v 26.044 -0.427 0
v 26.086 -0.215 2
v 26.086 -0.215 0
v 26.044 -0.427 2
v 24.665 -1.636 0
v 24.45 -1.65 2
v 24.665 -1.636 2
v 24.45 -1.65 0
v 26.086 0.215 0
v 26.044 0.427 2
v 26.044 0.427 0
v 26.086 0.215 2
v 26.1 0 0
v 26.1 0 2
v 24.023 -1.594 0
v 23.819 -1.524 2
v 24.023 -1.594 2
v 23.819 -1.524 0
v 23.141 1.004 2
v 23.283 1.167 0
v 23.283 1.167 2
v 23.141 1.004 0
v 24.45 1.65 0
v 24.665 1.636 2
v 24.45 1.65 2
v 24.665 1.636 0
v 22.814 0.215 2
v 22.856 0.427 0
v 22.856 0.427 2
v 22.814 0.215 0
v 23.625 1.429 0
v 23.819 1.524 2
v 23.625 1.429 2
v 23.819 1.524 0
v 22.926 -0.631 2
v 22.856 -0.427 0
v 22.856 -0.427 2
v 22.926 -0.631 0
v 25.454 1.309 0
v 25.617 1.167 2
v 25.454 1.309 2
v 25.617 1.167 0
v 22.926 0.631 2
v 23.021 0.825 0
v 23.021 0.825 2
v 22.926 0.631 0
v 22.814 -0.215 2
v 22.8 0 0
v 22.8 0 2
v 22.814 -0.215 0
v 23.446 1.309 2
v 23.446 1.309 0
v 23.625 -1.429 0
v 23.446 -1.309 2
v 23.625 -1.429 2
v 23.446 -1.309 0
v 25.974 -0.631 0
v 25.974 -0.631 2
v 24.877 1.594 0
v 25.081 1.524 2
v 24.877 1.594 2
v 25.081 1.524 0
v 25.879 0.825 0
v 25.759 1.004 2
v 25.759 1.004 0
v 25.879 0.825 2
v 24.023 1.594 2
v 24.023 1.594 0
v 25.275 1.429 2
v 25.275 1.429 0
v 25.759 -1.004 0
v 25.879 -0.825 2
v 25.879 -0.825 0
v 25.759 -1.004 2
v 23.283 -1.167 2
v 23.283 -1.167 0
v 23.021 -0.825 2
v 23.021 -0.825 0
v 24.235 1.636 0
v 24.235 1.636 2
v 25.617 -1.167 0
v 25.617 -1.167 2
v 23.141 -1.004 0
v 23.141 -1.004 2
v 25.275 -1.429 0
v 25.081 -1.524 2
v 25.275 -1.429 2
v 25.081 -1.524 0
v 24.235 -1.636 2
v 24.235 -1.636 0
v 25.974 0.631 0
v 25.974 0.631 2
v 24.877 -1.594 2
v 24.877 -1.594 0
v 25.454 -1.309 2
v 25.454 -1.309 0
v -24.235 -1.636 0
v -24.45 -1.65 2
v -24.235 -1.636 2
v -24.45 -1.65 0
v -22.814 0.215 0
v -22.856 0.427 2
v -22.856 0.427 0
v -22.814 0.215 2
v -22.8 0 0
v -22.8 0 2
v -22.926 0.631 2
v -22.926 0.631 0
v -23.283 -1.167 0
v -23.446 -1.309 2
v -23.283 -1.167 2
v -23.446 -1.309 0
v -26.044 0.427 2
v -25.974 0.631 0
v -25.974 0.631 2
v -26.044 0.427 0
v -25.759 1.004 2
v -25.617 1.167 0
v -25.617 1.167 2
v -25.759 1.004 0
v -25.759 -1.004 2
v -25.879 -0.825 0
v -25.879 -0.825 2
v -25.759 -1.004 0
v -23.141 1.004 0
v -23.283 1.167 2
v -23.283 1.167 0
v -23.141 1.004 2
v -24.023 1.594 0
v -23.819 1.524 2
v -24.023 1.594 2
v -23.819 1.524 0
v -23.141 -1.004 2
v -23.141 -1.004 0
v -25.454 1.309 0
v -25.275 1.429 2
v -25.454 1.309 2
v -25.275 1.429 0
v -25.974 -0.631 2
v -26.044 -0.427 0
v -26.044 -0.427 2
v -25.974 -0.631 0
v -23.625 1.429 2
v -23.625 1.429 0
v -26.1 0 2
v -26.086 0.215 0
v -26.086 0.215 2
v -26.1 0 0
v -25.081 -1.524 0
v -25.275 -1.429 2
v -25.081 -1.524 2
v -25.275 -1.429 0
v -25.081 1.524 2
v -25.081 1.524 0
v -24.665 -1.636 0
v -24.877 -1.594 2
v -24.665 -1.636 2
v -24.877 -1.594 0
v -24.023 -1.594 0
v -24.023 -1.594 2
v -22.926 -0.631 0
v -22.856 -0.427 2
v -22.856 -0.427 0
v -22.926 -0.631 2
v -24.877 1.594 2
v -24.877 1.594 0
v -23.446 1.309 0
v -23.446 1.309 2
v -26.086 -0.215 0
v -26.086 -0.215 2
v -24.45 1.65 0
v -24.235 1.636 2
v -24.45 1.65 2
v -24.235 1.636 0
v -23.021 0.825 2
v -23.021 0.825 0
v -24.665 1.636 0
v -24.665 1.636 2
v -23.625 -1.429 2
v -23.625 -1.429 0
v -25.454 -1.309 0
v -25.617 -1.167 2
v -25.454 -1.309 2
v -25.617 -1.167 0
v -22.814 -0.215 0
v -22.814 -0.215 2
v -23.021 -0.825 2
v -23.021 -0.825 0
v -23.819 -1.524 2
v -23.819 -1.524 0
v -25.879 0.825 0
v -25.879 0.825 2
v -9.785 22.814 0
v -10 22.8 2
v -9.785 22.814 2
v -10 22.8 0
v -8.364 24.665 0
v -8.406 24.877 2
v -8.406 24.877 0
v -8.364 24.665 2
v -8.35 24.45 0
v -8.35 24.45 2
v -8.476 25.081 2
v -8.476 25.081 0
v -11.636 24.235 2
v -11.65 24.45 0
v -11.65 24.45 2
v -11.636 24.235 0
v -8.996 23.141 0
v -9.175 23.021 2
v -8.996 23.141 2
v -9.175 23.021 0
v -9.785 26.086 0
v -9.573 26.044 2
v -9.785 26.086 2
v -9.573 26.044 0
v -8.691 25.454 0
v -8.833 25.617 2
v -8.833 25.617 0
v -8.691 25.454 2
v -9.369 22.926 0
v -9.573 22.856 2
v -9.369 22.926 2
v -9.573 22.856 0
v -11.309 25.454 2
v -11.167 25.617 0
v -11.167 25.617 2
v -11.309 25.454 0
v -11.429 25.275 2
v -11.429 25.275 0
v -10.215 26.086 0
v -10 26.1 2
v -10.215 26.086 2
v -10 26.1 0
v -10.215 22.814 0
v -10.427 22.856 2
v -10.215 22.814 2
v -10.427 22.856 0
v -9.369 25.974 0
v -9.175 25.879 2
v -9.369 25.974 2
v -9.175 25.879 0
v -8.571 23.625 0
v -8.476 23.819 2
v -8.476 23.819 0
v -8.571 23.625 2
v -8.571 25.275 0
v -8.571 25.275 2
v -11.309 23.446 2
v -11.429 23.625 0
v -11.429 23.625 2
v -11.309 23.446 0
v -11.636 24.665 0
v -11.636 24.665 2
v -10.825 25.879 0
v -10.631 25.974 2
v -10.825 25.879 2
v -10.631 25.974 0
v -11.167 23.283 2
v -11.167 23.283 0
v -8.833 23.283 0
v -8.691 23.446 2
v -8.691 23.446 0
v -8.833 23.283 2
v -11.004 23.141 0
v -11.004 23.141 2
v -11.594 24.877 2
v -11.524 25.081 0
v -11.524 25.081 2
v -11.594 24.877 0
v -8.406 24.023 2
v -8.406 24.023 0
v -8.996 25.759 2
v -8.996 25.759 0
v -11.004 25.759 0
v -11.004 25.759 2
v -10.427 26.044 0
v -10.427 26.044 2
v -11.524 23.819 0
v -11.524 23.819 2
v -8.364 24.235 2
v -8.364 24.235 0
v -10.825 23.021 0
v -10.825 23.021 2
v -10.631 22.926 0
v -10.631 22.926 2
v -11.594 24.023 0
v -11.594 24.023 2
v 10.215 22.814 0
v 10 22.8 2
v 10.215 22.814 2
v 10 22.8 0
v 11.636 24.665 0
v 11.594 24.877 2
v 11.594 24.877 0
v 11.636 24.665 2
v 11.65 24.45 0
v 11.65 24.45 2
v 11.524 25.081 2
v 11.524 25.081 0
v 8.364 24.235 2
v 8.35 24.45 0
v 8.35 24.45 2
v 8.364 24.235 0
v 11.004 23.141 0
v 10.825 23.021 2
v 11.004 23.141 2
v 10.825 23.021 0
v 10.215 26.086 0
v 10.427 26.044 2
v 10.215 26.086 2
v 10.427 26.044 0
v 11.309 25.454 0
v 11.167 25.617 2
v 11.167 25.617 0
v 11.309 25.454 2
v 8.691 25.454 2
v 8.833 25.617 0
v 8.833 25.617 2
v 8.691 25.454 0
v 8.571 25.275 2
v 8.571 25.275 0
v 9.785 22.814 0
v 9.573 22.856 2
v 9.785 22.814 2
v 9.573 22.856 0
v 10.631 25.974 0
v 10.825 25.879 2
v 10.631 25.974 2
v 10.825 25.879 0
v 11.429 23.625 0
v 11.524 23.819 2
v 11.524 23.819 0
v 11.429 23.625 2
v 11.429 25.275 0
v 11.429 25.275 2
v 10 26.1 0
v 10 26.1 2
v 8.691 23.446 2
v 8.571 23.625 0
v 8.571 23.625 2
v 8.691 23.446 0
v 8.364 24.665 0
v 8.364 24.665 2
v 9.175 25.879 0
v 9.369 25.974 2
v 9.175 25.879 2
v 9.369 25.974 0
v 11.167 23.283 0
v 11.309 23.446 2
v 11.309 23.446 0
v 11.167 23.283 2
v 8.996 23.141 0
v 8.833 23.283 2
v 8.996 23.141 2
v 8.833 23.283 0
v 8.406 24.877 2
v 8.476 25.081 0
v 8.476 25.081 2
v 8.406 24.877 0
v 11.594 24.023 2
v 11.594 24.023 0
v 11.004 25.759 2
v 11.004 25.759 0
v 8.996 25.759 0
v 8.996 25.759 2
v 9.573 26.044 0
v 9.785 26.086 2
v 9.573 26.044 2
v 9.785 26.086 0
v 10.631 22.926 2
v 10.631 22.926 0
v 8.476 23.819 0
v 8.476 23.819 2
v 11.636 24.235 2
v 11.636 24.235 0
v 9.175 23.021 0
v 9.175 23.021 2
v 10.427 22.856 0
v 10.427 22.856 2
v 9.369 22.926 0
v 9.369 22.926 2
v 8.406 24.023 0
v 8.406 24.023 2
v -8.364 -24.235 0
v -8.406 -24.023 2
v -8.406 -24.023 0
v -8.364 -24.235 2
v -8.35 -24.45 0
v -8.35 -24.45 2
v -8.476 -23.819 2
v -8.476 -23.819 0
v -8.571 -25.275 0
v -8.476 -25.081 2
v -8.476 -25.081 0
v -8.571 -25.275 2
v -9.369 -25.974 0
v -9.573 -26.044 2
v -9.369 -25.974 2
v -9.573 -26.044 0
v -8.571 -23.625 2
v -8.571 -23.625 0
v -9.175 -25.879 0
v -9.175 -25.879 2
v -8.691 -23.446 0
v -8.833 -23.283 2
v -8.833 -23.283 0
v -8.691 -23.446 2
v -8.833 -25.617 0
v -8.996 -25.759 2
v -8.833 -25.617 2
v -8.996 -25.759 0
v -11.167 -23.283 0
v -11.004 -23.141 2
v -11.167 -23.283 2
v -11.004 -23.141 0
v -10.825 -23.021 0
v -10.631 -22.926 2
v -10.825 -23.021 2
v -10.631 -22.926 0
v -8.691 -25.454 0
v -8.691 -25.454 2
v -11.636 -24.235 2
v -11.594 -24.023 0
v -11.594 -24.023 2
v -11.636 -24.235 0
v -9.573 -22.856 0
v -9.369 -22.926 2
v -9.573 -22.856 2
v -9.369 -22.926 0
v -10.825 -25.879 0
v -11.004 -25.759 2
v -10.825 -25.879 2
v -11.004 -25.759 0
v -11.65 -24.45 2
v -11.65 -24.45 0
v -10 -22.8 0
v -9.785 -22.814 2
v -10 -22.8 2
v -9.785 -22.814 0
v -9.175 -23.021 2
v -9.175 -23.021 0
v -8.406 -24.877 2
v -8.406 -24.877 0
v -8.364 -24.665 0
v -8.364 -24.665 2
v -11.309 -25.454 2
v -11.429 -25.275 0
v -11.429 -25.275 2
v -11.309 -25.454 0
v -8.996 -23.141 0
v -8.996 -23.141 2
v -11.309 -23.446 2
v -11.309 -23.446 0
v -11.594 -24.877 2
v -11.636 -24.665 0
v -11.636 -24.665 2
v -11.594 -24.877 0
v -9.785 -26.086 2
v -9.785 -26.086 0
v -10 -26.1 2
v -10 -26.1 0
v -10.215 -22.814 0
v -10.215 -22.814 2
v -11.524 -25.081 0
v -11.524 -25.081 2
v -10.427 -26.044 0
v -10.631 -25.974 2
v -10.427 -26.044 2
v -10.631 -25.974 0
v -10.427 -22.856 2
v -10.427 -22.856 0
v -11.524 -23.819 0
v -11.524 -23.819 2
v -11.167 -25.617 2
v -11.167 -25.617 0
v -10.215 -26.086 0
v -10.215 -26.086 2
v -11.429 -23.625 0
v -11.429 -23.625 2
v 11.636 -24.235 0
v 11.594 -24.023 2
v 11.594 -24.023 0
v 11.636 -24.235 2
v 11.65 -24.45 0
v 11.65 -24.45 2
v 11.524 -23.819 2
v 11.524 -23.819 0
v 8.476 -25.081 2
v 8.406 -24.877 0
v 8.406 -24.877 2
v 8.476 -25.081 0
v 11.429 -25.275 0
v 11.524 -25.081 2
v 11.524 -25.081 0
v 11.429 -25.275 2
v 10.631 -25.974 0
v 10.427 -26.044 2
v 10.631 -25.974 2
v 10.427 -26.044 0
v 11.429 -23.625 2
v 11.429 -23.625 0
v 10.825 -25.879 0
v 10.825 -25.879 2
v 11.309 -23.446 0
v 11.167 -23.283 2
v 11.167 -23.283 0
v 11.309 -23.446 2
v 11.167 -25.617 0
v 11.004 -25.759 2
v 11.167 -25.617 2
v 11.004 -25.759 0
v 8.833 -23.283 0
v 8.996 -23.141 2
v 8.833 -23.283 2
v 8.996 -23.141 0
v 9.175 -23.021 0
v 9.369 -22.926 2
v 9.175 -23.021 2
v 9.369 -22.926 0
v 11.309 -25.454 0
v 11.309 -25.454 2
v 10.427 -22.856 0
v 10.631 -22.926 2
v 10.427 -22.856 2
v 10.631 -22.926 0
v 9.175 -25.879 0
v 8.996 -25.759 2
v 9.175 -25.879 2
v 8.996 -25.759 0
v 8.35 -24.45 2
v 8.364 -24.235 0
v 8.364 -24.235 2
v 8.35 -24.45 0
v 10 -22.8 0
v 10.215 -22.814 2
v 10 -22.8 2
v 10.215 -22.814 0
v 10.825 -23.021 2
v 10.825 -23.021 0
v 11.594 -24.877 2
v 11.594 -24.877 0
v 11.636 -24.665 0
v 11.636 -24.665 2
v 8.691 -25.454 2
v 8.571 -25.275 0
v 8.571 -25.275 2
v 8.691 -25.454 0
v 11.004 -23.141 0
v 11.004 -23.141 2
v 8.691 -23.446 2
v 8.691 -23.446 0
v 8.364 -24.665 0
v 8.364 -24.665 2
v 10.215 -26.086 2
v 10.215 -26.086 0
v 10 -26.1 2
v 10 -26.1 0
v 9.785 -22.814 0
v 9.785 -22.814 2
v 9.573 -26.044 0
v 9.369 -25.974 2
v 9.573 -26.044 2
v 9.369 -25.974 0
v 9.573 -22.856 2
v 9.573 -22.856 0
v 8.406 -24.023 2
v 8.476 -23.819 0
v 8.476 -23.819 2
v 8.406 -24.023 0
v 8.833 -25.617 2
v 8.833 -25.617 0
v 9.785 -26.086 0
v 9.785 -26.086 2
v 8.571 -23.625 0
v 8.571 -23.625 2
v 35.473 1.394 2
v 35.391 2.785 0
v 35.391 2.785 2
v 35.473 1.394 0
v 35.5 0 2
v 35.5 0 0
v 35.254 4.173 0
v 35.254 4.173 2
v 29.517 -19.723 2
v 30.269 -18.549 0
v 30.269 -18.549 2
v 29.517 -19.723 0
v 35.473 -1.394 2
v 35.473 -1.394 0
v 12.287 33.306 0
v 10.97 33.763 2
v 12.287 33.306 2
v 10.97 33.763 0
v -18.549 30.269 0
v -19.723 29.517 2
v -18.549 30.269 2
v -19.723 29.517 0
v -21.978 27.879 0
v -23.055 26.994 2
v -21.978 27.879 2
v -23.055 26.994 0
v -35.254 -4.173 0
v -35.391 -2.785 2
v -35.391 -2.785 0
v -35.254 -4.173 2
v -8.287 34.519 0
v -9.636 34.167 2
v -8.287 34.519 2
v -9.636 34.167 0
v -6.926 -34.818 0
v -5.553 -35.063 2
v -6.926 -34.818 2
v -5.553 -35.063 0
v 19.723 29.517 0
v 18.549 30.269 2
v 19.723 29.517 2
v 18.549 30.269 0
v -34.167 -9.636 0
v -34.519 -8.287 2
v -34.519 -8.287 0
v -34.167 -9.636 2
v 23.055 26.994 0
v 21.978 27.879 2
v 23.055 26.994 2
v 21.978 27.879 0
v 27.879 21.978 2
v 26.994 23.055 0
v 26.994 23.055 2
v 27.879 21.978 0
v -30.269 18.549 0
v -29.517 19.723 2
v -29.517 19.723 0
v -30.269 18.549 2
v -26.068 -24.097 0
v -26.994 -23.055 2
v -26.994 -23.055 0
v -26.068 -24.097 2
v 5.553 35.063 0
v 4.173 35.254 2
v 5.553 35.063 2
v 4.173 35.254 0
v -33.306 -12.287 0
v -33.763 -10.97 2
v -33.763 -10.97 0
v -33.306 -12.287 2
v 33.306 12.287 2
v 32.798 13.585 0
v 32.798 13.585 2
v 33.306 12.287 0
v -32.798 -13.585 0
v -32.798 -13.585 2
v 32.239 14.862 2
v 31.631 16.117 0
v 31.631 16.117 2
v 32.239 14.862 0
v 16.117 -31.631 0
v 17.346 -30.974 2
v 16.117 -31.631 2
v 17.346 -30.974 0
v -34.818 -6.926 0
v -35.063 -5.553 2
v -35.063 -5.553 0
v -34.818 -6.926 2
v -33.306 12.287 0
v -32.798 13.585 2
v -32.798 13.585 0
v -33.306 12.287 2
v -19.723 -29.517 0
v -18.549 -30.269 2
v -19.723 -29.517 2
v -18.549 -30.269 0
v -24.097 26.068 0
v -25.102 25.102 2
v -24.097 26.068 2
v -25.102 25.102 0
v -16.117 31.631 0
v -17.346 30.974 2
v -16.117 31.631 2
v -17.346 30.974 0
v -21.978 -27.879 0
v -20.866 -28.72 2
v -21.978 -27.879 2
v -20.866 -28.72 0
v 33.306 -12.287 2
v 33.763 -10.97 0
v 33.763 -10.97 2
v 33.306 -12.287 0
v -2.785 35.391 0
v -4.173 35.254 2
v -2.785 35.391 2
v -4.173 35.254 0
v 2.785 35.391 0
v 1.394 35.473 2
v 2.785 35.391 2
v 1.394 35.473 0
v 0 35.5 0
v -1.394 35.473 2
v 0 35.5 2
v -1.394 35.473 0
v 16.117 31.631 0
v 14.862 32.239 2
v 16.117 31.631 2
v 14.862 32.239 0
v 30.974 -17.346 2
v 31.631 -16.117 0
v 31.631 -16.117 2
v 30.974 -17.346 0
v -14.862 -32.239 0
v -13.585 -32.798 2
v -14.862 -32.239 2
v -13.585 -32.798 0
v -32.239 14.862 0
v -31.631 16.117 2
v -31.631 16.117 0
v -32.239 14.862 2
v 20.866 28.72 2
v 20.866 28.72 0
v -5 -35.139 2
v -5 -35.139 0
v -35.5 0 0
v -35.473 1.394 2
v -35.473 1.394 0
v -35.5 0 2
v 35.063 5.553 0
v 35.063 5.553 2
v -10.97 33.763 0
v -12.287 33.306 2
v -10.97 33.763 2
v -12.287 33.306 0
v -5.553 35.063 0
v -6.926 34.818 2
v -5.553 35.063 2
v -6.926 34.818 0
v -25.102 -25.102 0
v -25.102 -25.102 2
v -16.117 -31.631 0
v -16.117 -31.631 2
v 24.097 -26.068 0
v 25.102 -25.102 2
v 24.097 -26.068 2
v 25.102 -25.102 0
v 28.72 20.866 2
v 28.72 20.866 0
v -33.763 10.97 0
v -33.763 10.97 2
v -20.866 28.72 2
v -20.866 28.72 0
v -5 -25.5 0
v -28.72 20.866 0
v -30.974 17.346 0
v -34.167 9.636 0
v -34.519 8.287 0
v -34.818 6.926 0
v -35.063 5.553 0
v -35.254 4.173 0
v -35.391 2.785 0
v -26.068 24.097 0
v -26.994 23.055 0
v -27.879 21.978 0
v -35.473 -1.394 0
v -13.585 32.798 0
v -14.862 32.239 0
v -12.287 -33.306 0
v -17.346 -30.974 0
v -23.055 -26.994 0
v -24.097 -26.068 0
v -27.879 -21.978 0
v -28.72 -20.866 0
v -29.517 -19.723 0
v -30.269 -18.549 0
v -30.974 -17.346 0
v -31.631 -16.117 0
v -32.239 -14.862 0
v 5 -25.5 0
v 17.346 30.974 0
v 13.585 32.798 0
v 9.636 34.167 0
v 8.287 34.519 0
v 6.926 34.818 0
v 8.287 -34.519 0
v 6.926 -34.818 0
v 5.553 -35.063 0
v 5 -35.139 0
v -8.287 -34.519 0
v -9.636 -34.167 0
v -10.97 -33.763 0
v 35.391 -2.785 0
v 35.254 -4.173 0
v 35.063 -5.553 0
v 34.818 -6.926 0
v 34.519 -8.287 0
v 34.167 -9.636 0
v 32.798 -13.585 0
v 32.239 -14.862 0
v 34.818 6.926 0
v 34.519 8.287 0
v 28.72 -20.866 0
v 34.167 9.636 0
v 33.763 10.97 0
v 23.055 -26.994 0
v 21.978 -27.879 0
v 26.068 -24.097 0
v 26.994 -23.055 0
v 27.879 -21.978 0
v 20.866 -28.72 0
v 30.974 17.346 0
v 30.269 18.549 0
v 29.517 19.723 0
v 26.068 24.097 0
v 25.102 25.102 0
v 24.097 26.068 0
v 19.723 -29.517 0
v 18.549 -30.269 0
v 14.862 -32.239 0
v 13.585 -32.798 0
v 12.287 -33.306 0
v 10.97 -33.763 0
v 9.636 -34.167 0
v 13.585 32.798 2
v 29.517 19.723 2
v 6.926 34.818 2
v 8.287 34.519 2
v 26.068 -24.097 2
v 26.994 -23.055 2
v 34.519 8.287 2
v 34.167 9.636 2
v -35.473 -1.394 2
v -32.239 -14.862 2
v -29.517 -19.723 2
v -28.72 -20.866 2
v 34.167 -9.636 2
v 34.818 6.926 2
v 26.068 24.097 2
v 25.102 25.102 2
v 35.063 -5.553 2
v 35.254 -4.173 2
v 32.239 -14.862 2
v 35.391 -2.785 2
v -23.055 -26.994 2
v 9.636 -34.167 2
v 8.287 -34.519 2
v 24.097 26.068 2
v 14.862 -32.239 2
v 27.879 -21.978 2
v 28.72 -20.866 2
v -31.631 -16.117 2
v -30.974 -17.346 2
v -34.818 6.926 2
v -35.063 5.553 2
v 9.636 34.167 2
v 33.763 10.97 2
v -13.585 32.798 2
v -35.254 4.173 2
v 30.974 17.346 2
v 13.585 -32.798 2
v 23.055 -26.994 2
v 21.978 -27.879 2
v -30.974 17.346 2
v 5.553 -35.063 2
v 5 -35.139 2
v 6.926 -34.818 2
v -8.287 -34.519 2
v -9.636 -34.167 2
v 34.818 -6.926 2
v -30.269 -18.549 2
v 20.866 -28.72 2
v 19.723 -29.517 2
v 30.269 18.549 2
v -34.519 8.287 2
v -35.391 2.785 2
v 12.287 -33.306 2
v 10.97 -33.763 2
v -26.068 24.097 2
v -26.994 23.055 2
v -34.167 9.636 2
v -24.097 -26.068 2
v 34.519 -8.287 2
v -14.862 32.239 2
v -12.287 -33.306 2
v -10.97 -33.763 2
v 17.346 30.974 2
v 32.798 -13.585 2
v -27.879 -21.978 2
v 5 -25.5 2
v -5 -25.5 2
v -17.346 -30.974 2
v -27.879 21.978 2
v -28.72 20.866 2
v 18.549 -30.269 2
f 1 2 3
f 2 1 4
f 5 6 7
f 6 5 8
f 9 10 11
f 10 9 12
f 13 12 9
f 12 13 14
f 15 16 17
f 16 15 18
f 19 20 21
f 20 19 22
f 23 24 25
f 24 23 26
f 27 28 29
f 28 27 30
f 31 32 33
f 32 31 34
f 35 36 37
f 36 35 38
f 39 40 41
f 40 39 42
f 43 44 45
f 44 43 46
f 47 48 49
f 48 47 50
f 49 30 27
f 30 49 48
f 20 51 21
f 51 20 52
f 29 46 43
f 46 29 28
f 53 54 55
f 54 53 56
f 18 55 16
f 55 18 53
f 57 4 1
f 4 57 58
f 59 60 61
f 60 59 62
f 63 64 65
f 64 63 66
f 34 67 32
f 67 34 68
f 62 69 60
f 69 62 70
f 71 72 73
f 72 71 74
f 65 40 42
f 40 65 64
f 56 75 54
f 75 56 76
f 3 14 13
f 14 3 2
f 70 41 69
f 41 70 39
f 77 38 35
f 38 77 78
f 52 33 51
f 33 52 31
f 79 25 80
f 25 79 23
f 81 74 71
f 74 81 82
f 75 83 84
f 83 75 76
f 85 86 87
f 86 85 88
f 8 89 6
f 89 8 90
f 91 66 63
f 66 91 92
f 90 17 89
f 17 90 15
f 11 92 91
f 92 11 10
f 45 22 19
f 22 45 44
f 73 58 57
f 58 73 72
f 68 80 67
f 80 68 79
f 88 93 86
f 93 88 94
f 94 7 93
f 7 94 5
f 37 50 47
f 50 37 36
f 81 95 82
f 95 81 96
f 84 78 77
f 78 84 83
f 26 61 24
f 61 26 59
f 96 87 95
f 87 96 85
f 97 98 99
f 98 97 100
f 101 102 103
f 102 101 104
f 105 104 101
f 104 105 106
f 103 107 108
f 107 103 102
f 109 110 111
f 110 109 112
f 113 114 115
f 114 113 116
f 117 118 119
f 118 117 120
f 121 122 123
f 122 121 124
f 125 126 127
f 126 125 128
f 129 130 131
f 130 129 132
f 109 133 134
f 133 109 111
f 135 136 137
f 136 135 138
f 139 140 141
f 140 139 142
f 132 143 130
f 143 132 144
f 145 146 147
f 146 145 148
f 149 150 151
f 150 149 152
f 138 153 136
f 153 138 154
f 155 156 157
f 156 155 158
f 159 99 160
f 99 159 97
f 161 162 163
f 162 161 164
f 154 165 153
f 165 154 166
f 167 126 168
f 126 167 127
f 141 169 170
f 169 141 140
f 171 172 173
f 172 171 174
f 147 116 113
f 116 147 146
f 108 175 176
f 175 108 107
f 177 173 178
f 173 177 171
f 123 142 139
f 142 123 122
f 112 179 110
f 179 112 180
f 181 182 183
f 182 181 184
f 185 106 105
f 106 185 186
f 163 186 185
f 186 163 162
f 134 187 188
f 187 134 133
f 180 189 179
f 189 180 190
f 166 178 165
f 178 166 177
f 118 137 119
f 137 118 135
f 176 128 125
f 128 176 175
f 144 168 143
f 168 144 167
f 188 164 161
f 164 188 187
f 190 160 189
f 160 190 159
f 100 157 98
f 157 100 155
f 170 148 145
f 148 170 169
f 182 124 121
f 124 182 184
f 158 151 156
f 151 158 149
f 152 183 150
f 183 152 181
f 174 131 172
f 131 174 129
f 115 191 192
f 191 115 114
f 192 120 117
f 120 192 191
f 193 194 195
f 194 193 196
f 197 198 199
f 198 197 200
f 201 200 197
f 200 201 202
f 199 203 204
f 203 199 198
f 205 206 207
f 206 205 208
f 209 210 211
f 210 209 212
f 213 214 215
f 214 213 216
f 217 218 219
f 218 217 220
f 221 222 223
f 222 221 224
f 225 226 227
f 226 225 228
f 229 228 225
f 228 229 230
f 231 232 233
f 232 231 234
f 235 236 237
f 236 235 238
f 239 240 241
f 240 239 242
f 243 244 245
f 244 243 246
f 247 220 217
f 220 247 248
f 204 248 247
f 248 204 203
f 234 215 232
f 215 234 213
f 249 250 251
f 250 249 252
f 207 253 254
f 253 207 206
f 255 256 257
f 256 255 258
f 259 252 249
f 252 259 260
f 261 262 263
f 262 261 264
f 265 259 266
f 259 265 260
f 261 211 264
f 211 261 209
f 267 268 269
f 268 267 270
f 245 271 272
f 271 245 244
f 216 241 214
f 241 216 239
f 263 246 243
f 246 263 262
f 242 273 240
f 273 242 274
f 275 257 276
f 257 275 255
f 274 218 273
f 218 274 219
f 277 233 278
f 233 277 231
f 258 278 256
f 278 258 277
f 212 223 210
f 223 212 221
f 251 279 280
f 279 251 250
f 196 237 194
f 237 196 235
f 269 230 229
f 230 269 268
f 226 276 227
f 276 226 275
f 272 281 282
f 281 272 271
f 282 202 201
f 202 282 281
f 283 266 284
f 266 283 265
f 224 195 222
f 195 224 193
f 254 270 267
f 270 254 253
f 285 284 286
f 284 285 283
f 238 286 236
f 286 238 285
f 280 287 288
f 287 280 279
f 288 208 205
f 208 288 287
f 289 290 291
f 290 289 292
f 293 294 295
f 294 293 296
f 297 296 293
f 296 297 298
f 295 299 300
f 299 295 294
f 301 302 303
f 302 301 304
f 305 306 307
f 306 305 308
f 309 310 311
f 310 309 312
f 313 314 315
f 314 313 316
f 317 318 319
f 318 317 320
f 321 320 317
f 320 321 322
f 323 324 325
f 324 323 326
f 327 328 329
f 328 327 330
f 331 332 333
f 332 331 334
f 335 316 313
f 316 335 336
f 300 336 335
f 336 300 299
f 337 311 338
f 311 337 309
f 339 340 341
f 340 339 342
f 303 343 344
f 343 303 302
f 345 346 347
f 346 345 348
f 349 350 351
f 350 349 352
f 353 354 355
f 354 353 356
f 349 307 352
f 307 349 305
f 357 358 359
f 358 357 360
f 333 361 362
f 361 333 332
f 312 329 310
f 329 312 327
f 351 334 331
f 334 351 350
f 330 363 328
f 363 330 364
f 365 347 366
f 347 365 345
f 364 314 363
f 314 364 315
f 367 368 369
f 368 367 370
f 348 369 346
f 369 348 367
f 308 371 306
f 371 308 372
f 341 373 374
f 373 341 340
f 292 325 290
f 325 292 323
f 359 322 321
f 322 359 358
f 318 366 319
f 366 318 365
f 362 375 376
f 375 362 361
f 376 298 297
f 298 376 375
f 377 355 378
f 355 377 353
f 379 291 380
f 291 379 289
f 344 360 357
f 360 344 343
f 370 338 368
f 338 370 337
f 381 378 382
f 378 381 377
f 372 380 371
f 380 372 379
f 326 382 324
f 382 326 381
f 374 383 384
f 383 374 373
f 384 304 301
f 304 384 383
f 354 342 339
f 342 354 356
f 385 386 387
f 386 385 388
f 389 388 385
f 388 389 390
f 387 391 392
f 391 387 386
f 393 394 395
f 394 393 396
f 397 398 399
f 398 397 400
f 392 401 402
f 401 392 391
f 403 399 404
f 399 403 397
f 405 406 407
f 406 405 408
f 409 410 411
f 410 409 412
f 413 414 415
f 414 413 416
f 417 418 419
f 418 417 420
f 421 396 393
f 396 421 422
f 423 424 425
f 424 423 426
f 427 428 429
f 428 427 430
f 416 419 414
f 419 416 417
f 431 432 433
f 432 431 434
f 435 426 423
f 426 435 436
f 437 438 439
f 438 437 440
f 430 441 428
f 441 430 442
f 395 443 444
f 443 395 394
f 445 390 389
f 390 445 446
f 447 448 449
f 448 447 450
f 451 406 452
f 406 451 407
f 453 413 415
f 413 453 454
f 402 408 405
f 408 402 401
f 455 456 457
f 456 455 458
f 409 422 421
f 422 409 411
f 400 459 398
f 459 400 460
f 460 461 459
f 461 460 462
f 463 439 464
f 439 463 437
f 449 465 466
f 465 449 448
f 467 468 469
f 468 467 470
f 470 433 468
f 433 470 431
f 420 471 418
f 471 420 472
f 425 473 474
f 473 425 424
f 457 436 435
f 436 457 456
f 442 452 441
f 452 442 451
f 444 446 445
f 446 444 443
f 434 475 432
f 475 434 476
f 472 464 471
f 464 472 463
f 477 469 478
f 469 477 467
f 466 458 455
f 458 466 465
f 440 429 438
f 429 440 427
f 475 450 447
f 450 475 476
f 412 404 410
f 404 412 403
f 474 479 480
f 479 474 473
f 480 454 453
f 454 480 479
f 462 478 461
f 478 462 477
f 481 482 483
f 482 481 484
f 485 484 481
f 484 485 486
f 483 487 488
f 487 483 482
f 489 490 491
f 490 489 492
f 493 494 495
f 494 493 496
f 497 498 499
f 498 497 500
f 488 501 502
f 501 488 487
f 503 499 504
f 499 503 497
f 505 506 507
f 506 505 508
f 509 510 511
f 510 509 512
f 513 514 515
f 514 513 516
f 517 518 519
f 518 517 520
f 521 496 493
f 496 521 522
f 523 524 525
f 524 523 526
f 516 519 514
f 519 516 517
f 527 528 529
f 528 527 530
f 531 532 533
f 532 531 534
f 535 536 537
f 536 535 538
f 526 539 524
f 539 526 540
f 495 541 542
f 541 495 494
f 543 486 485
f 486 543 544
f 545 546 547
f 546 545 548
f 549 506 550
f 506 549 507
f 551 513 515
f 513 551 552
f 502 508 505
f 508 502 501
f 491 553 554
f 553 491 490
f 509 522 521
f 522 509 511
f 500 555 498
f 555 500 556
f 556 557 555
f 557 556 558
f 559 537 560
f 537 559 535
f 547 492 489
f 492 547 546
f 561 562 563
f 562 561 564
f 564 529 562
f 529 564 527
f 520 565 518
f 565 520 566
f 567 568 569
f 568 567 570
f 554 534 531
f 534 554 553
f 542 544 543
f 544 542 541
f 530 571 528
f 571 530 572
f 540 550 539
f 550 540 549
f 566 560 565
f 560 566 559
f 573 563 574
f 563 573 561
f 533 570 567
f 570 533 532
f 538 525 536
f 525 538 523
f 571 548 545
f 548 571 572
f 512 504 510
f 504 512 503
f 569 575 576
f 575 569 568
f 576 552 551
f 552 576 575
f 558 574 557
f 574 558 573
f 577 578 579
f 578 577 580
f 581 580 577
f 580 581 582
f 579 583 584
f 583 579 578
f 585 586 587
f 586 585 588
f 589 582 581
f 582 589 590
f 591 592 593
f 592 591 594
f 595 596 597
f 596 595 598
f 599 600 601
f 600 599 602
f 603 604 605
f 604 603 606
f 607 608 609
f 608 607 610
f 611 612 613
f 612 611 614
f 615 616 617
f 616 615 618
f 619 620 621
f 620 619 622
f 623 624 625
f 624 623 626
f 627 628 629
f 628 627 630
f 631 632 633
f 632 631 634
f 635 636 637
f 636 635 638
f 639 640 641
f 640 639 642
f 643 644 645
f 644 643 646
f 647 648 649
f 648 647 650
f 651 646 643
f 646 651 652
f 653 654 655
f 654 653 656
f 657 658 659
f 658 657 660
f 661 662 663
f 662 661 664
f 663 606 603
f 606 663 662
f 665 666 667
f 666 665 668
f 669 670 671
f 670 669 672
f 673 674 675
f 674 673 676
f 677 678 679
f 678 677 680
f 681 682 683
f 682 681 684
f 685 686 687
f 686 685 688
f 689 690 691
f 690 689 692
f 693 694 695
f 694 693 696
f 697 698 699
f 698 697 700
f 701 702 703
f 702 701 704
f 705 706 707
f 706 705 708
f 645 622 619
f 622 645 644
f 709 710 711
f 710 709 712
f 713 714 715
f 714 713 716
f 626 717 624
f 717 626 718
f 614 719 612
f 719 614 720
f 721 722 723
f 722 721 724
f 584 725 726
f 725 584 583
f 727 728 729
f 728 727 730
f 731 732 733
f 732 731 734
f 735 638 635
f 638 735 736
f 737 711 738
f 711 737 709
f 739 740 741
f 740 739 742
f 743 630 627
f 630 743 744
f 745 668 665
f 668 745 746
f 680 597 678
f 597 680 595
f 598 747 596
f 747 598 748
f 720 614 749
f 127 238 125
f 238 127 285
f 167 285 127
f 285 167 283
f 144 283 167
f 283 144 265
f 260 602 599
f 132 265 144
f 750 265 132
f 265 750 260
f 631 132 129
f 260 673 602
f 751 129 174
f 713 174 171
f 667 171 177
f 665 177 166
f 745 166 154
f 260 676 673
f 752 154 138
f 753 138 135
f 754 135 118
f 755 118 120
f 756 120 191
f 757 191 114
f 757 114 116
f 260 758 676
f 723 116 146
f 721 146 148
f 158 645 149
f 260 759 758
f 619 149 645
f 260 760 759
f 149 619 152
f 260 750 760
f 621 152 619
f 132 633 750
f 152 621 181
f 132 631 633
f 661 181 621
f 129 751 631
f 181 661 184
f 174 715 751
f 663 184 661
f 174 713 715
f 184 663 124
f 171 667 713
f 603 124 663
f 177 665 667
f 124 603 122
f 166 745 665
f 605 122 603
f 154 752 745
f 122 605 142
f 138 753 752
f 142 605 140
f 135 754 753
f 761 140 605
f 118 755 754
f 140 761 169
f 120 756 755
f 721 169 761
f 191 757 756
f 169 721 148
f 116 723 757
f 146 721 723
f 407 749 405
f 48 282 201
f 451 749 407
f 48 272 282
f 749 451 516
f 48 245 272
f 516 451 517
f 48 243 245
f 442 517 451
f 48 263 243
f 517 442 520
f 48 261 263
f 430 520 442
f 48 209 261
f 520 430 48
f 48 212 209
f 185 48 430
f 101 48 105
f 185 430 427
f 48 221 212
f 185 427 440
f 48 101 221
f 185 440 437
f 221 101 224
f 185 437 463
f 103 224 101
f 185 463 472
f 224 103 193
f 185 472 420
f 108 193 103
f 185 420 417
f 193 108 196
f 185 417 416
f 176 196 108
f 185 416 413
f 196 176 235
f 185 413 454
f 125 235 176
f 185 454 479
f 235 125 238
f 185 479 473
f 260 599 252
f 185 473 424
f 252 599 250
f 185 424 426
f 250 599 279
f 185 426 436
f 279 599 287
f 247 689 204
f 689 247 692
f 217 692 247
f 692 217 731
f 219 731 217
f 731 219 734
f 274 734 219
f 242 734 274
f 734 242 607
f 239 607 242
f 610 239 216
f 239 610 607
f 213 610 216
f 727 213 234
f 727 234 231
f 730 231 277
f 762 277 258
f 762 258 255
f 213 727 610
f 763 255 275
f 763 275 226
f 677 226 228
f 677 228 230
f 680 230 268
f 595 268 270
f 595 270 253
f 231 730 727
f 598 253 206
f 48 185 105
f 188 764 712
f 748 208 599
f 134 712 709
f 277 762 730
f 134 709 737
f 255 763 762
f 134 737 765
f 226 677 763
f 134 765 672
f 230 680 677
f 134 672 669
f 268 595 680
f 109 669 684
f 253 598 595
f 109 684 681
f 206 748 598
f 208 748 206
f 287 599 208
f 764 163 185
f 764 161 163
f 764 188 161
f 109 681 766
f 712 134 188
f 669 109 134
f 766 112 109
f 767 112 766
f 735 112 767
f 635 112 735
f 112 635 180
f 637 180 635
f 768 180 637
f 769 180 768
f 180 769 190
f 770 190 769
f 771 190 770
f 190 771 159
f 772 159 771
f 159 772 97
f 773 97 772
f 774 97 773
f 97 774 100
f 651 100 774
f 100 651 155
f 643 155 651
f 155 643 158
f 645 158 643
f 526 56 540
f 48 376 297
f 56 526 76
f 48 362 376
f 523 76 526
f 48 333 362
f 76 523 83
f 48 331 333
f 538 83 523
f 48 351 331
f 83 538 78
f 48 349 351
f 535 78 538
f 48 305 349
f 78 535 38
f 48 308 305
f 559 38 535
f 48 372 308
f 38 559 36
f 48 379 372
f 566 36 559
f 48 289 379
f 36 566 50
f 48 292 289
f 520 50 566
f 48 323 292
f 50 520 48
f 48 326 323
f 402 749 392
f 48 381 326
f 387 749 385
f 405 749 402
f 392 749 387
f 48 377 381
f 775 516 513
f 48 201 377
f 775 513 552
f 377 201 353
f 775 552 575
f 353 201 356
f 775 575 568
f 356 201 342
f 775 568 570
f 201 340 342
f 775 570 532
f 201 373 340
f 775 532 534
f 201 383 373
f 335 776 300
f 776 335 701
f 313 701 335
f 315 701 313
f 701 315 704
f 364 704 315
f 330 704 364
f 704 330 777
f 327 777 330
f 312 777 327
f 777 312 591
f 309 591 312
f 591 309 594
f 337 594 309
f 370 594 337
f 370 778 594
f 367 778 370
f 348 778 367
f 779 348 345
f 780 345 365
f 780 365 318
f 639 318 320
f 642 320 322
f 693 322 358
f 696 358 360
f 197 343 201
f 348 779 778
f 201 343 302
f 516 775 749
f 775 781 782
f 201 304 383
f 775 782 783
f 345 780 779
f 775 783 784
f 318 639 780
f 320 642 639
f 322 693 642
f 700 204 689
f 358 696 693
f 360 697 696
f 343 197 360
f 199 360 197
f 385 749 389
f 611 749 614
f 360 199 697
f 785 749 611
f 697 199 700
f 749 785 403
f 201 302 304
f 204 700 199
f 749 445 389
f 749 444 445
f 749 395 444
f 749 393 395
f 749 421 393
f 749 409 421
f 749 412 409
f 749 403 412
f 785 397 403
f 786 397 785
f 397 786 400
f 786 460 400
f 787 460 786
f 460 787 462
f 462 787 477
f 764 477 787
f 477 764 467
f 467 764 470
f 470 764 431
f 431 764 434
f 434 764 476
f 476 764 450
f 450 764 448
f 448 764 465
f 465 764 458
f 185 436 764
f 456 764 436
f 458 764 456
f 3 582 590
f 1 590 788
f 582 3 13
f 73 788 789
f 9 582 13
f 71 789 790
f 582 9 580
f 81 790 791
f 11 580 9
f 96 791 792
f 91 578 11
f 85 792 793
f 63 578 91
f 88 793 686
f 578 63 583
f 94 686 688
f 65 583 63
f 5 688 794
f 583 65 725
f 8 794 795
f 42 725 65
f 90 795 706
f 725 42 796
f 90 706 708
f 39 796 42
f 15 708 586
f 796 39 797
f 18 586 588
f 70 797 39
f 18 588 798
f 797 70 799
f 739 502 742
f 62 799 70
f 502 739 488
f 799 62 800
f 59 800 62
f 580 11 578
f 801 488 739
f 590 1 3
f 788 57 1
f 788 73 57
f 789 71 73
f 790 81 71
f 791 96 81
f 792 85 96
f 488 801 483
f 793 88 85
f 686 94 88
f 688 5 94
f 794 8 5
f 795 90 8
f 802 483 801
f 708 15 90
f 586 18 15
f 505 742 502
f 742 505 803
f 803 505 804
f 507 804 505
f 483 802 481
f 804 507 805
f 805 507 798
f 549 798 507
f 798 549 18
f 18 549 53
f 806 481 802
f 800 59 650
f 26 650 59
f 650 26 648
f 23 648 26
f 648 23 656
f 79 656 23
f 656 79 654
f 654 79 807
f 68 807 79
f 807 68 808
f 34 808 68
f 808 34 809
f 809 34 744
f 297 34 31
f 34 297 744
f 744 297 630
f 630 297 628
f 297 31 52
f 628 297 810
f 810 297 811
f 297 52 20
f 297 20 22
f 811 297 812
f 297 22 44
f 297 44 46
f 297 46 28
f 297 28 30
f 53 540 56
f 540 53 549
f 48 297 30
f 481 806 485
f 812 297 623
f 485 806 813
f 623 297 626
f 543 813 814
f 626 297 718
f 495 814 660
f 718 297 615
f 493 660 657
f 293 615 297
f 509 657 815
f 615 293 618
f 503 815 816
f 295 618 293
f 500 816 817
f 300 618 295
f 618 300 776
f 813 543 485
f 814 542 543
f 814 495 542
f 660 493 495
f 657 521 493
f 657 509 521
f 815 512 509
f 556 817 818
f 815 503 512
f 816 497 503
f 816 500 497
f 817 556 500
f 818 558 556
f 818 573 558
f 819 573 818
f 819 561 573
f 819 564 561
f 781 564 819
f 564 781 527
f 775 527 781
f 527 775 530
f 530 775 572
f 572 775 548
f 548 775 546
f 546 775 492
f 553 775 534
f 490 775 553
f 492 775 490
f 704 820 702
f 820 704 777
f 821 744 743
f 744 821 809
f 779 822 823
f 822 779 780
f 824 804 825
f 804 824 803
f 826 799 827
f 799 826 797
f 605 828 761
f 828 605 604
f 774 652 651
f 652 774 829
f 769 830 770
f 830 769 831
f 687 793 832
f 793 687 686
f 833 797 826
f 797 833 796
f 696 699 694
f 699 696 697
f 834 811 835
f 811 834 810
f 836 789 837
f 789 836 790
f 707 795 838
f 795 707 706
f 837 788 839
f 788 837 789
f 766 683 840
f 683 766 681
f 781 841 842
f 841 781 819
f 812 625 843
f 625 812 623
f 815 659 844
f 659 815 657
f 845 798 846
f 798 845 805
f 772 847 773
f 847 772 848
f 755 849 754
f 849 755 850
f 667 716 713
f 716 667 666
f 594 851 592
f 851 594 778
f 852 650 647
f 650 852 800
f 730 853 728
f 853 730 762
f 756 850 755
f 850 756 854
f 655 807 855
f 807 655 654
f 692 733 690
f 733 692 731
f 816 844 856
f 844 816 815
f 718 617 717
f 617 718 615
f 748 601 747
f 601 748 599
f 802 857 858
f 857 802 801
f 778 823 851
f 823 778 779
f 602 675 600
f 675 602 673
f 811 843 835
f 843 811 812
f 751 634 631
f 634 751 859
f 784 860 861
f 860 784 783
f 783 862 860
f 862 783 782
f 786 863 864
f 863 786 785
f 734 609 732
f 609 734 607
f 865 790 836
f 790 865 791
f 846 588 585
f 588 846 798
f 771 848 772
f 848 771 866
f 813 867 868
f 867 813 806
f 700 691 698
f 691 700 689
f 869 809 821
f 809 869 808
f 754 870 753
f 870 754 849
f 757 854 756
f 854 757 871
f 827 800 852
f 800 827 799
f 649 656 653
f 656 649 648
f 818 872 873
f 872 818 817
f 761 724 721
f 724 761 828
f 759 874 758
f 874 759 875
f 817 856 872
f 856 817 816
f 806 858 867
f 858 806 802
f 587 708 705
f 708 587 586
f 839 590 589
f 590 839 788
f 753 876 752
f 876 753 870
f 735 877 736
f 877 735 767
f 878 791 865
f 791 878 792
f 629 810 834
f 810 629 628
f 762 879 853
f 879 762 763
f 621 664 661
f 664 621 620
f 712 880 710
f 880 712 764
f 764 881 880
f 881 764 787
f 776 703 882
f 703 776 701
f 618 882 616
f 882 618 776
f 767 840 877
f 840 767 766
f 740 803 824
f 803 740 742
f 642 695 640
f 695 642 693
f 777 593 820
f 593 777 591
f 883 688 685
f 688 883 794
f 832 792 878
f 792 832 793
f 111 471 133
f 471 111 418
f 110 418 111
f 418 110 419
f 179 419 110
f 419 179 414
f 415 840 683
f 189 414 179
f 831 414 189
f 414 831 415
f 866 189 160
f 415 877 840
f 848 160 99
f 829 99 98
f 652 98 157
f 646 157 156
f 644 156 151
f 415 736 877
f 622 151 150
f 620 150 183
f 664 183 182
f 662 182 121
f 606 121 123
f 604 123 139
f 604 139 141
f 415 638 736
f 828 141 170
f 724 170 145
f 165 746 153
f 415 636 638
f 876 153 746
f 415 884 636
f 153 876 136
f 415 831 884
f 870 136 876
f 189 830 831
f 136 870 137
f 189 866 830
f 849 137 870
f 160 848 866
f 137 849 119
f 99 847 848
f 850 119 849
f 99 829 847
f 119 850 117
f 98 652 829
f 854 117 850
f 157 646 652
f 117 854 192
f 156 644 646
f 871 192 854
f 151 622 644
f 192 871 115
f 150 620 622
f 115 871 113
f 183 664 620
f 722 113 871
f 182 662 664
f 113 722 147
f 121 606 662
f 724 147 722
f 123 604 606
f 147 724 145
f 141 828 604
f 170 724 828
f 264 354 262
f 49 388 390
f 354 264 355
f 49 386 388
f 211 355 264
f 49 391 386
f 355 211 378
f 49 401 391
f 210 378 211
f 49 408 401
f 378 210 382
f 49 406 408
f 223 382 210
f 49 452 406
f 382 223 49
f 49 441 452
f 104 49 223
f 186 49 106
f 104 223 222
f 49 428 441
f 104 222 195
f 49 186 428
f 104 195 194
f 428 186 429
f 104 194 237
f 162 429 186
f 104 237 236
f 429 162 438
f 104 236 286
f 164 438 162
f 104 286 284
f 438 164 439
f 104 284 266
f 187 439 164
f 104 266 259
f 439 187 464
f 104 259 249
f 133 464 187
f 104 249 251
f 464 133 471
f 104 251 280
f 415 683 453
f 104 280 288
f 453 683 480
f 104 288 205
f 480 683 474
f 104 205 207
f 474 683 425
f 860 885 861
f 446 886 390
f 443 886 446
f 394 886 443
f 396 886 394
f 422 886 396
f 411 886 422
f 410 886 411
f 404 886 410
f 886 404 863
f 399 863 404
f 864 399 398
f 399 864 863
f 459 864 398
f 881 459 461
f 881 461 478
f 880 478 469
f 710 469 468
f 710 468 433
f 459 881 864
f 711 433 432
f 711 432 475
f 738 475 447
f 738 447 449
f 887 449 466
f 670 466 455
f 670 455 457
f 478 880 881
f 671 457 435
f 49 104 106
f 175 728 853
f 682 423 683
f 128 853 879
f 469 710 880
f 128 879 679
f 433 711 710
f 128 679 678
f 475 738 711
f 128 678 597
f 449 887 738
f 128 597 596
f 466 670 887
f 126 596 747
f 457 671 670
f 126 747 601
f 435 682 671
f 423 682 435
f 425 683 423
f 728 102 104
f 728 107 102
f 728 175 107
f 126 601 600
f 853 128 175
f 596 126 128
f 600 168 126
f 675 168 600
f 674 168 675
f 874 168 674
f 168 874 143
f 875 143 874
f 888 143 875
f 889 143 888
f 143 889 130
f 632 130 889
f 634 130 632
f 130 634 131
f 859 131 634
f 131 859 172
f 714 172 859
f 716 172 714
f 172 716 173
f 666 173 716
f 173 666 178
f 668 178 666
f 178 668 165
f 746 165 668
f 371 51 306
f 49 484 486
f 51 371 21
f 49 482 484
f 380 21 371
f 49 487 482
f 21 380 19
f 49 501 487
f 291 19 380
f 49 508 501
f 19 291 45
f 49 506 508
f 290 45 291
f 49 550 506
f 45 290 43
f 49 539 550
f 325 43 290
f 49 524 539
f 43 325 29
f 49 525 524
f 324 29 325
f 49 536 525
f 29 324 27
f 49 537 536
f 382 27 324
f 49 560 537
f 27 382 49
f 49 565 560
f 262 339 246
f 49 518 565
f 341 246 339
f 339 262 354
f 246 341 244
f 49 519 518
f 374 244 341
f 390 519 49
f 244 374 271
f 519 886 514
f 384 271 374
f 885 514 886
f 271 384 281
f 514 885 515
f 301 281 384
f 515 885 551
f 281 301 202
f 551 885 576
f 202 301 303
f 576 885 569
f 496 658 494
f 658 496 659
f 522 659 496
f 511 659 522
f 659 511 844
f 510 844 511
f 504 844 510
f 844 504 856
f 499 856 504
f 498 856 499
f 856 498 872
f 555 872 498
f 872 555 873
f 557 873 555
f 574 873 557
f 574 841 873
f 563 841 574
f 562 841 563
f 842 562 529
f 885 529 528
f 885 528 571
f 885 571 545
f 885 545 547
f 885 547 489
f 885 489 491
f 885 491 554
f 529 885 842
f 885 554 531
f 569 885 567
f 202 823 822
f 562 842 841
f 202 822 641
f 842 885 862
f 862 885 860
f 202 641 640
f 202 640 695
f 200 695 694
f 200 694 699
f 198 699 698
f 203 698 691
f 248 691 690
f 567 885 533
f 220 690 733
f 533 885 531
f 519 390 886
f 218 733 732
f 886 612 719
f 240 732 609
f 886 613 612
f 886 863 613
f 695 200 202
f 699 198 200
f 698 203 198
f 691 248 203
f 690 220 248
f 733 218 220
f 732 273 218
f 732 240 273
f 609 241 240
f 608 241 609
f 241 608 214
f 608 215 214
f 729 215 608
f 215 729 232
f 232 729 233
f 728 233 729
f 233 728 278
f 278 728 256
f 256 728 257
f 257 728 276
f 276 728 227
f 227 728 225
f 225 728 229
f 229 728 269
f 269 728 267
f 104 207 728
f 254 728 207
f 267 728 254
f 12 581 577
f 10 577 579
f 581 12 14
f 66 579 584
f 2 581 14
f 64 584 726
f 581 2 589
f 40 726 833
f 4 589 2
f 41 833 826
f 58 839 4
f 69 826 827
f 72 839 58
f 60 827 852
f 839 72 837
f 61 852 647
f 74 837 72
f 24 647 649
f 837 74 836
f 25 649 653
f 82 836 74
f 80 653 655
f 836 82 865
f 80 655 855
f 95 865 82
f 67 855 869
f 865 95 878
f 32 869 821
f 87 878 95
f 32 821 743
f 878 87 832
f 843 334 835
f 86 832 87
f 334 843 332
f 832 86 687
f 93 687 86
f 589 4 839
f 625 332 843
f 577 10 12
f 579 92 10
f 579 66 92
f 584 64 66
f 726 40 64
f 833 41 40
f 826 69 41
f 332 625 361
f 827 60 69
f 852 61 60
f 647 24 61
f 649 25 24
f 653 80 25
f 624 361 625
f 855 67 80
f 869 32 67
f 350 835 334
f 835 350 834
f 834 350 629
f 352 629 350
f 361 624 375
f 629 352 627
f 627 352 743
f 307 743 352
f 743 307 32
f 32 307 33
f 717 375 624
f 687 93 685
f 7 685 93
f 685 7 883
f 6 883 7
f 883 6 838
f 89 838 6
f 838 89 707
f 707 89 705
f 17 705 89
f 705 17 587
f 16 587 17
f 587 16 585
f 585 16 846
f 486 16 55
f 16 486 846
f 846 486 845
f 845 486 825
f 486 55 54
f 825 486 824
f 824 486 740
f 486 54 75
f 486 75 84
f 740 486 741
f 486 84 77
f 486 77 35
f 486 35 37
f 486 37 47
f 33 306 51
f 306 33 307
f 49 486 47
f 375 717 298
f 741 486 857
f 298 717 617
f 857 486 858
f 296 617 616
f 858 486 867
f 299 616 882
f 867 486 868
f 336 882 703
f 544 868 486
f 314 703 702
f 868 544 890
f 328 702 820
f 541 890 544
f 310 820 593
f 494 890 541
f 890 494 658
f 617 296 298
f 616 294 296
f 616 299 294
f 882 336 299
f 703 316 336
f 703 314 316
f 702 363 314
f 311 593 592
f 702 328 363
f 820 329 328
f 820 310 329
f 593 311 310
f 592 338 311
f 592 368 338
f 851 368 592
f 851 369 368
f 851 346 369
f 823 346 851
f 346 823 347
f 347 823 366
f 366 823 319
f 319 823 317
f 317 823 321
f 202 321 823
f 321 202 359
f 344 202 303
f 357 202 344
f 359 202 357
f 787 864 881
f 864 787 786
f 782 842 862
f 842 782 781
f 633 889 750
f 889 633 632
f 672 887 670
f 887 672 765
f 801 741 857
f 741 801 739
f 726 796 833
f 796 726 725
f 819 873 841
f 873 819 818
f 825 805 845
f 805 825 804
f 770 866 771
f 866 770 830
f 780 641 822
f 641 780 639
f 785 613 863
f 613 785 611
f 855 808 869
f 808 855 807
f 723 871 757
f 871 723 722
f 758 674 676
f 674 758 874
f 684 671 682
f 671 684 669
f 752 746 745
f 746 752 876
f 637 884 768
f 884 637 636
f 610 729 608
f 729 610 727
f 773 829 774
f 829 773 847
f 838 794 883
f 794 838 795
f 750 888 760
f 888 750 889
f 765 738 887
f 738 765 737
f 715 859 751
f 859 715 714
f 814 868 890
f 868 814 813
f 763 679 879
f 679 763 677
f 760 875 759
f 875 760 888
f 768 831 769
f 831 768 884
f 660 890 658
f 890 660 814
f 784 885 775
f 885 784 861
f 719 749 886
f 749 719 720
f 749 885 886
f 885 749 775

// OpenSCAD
// ============================================================
//  GRIPPER MOTOR COVER - v1
//  Nap bit khoang dong co cho body v31
//  Don vi: mm
//
//  - Lap vao truoc, sau do moi lap base v9.
//  - Than body v31 co long duoi D72 (R36), nap nho hon 1mm => D71.
//  - Day 3.5mm.
//  - 6 lo bat oc trung voi 6 lo moi M4 trong body v31.
//  - Co o/khe cho day motor di xuong ve phia -Y, trung huong motor_tail_clearance.
// ============================================================

$fn = 160;
eps = 0.05;

// Kich thuoc nap
body_bottom_inner_D = 72.0;          // body v31: bottom_inner_R = 36
cover_clearance_D   = 1.0;           // nho hon duong tron rong cua than 1mm
cover_D             = body_bottom_inner_D - cover_clearance_D; // D71
cover_R             = cover_D/2;
cover_H             = 2.0;

// Lo bat oc: body v31 co 6 lo moi M4 D3.3 de taro/bat oc.
// Tren nap de lo thong M4, cong clearance nhe de de lap.
screw_clear_D = 3.3; // cung size voi 6 lo tren body

// Lay dung toa do tu body v31
motor_body_W = 42.3 + 0.6;
motor_body_L = 42.3 + 0.6;
bottom_cover_pilot_edge_offset = 3;
bottom_cover_pilot_pair_offset = 10;
bottom_cover_pilot_X_edge = motor_body_W/2 + bottom_cover_pilot_edge_offset; // 24.45
bottom_cover_pilot_Y_edge = motor_body_L/2 + bottom_cover_pilot_edge_offset; // 24.45

cover_hole_pts = [
    [ bottom_cover_pilot_X_edge, 0],
    [-bottom_cover_pilot_X_edge, 0],
    [-bottom_cover_pilot_pair_offset,  bottom_cover_pilot_Y_edge],
    [ bottom_cover_pilot_pair_offset,  bottom_cover_pilot_Y_edge],
    [-bottom_cover_pilot_pair_offset, -bottom_cover_pilot_Y_edge],
    [ bottom_cover_pilot_pair_offset, -bottom_cover_pilot_Y_edge]
];

// O/khe day motor di xuong.
// Body v31: motor_tail_clear_W=16, motor_tail_clear_D=10 ve phia -Y.
// Nap khoet tu mep ngoai vao trong de day thoat xuong, cong rong nhe.
wire_slot_W = 10.0;
wire_slot_depth_from_edge = 10.0;
wire_slot_end_round_D = wire_slot_W;
wire_slot_on_negative_Y = true;

module wire_slot_cut() {
    ysign = wire_slot_on_negative_Y ? -1 : 1;
    // Chi cat nho dung vi tri day, sau vao tam ~4mm.
    translate([0, ysign*(cover_R - wire_slot_depth_from_edge + wire_slot_W/2), cover_H/2])
        cube([wire_slot_W, wire_slot_depth_from_edge, cover_H + 2*eps], center=true);
}

module gripper_motor_cover_v1() {
    difference() {
        cylinder(h=cover_H, d=cover_D);

        // 6 lo thong bat oc len body
        for (p = cover_hole_pts) {
            translate([p[0], p[1], -eps])
                cylinder(h=cover_H + 2*eps, d=screw_clear_D, $fn=48);
        }

        // Khe/o day di xuong
        wire_slot_cut();
    }
}

gripper_motor_cover_v1();

echo("motor cover v1", "D", cover_D, "H", cover_H);
echo("6 holes", cover_hole_pts, "clear D", screw_clear_D);
echo("wire slot", [wire_slot_W, wire_slot_depth_from_edge], "side", wire_slot_on_negative_Y ? "-Y" : "+Y");
